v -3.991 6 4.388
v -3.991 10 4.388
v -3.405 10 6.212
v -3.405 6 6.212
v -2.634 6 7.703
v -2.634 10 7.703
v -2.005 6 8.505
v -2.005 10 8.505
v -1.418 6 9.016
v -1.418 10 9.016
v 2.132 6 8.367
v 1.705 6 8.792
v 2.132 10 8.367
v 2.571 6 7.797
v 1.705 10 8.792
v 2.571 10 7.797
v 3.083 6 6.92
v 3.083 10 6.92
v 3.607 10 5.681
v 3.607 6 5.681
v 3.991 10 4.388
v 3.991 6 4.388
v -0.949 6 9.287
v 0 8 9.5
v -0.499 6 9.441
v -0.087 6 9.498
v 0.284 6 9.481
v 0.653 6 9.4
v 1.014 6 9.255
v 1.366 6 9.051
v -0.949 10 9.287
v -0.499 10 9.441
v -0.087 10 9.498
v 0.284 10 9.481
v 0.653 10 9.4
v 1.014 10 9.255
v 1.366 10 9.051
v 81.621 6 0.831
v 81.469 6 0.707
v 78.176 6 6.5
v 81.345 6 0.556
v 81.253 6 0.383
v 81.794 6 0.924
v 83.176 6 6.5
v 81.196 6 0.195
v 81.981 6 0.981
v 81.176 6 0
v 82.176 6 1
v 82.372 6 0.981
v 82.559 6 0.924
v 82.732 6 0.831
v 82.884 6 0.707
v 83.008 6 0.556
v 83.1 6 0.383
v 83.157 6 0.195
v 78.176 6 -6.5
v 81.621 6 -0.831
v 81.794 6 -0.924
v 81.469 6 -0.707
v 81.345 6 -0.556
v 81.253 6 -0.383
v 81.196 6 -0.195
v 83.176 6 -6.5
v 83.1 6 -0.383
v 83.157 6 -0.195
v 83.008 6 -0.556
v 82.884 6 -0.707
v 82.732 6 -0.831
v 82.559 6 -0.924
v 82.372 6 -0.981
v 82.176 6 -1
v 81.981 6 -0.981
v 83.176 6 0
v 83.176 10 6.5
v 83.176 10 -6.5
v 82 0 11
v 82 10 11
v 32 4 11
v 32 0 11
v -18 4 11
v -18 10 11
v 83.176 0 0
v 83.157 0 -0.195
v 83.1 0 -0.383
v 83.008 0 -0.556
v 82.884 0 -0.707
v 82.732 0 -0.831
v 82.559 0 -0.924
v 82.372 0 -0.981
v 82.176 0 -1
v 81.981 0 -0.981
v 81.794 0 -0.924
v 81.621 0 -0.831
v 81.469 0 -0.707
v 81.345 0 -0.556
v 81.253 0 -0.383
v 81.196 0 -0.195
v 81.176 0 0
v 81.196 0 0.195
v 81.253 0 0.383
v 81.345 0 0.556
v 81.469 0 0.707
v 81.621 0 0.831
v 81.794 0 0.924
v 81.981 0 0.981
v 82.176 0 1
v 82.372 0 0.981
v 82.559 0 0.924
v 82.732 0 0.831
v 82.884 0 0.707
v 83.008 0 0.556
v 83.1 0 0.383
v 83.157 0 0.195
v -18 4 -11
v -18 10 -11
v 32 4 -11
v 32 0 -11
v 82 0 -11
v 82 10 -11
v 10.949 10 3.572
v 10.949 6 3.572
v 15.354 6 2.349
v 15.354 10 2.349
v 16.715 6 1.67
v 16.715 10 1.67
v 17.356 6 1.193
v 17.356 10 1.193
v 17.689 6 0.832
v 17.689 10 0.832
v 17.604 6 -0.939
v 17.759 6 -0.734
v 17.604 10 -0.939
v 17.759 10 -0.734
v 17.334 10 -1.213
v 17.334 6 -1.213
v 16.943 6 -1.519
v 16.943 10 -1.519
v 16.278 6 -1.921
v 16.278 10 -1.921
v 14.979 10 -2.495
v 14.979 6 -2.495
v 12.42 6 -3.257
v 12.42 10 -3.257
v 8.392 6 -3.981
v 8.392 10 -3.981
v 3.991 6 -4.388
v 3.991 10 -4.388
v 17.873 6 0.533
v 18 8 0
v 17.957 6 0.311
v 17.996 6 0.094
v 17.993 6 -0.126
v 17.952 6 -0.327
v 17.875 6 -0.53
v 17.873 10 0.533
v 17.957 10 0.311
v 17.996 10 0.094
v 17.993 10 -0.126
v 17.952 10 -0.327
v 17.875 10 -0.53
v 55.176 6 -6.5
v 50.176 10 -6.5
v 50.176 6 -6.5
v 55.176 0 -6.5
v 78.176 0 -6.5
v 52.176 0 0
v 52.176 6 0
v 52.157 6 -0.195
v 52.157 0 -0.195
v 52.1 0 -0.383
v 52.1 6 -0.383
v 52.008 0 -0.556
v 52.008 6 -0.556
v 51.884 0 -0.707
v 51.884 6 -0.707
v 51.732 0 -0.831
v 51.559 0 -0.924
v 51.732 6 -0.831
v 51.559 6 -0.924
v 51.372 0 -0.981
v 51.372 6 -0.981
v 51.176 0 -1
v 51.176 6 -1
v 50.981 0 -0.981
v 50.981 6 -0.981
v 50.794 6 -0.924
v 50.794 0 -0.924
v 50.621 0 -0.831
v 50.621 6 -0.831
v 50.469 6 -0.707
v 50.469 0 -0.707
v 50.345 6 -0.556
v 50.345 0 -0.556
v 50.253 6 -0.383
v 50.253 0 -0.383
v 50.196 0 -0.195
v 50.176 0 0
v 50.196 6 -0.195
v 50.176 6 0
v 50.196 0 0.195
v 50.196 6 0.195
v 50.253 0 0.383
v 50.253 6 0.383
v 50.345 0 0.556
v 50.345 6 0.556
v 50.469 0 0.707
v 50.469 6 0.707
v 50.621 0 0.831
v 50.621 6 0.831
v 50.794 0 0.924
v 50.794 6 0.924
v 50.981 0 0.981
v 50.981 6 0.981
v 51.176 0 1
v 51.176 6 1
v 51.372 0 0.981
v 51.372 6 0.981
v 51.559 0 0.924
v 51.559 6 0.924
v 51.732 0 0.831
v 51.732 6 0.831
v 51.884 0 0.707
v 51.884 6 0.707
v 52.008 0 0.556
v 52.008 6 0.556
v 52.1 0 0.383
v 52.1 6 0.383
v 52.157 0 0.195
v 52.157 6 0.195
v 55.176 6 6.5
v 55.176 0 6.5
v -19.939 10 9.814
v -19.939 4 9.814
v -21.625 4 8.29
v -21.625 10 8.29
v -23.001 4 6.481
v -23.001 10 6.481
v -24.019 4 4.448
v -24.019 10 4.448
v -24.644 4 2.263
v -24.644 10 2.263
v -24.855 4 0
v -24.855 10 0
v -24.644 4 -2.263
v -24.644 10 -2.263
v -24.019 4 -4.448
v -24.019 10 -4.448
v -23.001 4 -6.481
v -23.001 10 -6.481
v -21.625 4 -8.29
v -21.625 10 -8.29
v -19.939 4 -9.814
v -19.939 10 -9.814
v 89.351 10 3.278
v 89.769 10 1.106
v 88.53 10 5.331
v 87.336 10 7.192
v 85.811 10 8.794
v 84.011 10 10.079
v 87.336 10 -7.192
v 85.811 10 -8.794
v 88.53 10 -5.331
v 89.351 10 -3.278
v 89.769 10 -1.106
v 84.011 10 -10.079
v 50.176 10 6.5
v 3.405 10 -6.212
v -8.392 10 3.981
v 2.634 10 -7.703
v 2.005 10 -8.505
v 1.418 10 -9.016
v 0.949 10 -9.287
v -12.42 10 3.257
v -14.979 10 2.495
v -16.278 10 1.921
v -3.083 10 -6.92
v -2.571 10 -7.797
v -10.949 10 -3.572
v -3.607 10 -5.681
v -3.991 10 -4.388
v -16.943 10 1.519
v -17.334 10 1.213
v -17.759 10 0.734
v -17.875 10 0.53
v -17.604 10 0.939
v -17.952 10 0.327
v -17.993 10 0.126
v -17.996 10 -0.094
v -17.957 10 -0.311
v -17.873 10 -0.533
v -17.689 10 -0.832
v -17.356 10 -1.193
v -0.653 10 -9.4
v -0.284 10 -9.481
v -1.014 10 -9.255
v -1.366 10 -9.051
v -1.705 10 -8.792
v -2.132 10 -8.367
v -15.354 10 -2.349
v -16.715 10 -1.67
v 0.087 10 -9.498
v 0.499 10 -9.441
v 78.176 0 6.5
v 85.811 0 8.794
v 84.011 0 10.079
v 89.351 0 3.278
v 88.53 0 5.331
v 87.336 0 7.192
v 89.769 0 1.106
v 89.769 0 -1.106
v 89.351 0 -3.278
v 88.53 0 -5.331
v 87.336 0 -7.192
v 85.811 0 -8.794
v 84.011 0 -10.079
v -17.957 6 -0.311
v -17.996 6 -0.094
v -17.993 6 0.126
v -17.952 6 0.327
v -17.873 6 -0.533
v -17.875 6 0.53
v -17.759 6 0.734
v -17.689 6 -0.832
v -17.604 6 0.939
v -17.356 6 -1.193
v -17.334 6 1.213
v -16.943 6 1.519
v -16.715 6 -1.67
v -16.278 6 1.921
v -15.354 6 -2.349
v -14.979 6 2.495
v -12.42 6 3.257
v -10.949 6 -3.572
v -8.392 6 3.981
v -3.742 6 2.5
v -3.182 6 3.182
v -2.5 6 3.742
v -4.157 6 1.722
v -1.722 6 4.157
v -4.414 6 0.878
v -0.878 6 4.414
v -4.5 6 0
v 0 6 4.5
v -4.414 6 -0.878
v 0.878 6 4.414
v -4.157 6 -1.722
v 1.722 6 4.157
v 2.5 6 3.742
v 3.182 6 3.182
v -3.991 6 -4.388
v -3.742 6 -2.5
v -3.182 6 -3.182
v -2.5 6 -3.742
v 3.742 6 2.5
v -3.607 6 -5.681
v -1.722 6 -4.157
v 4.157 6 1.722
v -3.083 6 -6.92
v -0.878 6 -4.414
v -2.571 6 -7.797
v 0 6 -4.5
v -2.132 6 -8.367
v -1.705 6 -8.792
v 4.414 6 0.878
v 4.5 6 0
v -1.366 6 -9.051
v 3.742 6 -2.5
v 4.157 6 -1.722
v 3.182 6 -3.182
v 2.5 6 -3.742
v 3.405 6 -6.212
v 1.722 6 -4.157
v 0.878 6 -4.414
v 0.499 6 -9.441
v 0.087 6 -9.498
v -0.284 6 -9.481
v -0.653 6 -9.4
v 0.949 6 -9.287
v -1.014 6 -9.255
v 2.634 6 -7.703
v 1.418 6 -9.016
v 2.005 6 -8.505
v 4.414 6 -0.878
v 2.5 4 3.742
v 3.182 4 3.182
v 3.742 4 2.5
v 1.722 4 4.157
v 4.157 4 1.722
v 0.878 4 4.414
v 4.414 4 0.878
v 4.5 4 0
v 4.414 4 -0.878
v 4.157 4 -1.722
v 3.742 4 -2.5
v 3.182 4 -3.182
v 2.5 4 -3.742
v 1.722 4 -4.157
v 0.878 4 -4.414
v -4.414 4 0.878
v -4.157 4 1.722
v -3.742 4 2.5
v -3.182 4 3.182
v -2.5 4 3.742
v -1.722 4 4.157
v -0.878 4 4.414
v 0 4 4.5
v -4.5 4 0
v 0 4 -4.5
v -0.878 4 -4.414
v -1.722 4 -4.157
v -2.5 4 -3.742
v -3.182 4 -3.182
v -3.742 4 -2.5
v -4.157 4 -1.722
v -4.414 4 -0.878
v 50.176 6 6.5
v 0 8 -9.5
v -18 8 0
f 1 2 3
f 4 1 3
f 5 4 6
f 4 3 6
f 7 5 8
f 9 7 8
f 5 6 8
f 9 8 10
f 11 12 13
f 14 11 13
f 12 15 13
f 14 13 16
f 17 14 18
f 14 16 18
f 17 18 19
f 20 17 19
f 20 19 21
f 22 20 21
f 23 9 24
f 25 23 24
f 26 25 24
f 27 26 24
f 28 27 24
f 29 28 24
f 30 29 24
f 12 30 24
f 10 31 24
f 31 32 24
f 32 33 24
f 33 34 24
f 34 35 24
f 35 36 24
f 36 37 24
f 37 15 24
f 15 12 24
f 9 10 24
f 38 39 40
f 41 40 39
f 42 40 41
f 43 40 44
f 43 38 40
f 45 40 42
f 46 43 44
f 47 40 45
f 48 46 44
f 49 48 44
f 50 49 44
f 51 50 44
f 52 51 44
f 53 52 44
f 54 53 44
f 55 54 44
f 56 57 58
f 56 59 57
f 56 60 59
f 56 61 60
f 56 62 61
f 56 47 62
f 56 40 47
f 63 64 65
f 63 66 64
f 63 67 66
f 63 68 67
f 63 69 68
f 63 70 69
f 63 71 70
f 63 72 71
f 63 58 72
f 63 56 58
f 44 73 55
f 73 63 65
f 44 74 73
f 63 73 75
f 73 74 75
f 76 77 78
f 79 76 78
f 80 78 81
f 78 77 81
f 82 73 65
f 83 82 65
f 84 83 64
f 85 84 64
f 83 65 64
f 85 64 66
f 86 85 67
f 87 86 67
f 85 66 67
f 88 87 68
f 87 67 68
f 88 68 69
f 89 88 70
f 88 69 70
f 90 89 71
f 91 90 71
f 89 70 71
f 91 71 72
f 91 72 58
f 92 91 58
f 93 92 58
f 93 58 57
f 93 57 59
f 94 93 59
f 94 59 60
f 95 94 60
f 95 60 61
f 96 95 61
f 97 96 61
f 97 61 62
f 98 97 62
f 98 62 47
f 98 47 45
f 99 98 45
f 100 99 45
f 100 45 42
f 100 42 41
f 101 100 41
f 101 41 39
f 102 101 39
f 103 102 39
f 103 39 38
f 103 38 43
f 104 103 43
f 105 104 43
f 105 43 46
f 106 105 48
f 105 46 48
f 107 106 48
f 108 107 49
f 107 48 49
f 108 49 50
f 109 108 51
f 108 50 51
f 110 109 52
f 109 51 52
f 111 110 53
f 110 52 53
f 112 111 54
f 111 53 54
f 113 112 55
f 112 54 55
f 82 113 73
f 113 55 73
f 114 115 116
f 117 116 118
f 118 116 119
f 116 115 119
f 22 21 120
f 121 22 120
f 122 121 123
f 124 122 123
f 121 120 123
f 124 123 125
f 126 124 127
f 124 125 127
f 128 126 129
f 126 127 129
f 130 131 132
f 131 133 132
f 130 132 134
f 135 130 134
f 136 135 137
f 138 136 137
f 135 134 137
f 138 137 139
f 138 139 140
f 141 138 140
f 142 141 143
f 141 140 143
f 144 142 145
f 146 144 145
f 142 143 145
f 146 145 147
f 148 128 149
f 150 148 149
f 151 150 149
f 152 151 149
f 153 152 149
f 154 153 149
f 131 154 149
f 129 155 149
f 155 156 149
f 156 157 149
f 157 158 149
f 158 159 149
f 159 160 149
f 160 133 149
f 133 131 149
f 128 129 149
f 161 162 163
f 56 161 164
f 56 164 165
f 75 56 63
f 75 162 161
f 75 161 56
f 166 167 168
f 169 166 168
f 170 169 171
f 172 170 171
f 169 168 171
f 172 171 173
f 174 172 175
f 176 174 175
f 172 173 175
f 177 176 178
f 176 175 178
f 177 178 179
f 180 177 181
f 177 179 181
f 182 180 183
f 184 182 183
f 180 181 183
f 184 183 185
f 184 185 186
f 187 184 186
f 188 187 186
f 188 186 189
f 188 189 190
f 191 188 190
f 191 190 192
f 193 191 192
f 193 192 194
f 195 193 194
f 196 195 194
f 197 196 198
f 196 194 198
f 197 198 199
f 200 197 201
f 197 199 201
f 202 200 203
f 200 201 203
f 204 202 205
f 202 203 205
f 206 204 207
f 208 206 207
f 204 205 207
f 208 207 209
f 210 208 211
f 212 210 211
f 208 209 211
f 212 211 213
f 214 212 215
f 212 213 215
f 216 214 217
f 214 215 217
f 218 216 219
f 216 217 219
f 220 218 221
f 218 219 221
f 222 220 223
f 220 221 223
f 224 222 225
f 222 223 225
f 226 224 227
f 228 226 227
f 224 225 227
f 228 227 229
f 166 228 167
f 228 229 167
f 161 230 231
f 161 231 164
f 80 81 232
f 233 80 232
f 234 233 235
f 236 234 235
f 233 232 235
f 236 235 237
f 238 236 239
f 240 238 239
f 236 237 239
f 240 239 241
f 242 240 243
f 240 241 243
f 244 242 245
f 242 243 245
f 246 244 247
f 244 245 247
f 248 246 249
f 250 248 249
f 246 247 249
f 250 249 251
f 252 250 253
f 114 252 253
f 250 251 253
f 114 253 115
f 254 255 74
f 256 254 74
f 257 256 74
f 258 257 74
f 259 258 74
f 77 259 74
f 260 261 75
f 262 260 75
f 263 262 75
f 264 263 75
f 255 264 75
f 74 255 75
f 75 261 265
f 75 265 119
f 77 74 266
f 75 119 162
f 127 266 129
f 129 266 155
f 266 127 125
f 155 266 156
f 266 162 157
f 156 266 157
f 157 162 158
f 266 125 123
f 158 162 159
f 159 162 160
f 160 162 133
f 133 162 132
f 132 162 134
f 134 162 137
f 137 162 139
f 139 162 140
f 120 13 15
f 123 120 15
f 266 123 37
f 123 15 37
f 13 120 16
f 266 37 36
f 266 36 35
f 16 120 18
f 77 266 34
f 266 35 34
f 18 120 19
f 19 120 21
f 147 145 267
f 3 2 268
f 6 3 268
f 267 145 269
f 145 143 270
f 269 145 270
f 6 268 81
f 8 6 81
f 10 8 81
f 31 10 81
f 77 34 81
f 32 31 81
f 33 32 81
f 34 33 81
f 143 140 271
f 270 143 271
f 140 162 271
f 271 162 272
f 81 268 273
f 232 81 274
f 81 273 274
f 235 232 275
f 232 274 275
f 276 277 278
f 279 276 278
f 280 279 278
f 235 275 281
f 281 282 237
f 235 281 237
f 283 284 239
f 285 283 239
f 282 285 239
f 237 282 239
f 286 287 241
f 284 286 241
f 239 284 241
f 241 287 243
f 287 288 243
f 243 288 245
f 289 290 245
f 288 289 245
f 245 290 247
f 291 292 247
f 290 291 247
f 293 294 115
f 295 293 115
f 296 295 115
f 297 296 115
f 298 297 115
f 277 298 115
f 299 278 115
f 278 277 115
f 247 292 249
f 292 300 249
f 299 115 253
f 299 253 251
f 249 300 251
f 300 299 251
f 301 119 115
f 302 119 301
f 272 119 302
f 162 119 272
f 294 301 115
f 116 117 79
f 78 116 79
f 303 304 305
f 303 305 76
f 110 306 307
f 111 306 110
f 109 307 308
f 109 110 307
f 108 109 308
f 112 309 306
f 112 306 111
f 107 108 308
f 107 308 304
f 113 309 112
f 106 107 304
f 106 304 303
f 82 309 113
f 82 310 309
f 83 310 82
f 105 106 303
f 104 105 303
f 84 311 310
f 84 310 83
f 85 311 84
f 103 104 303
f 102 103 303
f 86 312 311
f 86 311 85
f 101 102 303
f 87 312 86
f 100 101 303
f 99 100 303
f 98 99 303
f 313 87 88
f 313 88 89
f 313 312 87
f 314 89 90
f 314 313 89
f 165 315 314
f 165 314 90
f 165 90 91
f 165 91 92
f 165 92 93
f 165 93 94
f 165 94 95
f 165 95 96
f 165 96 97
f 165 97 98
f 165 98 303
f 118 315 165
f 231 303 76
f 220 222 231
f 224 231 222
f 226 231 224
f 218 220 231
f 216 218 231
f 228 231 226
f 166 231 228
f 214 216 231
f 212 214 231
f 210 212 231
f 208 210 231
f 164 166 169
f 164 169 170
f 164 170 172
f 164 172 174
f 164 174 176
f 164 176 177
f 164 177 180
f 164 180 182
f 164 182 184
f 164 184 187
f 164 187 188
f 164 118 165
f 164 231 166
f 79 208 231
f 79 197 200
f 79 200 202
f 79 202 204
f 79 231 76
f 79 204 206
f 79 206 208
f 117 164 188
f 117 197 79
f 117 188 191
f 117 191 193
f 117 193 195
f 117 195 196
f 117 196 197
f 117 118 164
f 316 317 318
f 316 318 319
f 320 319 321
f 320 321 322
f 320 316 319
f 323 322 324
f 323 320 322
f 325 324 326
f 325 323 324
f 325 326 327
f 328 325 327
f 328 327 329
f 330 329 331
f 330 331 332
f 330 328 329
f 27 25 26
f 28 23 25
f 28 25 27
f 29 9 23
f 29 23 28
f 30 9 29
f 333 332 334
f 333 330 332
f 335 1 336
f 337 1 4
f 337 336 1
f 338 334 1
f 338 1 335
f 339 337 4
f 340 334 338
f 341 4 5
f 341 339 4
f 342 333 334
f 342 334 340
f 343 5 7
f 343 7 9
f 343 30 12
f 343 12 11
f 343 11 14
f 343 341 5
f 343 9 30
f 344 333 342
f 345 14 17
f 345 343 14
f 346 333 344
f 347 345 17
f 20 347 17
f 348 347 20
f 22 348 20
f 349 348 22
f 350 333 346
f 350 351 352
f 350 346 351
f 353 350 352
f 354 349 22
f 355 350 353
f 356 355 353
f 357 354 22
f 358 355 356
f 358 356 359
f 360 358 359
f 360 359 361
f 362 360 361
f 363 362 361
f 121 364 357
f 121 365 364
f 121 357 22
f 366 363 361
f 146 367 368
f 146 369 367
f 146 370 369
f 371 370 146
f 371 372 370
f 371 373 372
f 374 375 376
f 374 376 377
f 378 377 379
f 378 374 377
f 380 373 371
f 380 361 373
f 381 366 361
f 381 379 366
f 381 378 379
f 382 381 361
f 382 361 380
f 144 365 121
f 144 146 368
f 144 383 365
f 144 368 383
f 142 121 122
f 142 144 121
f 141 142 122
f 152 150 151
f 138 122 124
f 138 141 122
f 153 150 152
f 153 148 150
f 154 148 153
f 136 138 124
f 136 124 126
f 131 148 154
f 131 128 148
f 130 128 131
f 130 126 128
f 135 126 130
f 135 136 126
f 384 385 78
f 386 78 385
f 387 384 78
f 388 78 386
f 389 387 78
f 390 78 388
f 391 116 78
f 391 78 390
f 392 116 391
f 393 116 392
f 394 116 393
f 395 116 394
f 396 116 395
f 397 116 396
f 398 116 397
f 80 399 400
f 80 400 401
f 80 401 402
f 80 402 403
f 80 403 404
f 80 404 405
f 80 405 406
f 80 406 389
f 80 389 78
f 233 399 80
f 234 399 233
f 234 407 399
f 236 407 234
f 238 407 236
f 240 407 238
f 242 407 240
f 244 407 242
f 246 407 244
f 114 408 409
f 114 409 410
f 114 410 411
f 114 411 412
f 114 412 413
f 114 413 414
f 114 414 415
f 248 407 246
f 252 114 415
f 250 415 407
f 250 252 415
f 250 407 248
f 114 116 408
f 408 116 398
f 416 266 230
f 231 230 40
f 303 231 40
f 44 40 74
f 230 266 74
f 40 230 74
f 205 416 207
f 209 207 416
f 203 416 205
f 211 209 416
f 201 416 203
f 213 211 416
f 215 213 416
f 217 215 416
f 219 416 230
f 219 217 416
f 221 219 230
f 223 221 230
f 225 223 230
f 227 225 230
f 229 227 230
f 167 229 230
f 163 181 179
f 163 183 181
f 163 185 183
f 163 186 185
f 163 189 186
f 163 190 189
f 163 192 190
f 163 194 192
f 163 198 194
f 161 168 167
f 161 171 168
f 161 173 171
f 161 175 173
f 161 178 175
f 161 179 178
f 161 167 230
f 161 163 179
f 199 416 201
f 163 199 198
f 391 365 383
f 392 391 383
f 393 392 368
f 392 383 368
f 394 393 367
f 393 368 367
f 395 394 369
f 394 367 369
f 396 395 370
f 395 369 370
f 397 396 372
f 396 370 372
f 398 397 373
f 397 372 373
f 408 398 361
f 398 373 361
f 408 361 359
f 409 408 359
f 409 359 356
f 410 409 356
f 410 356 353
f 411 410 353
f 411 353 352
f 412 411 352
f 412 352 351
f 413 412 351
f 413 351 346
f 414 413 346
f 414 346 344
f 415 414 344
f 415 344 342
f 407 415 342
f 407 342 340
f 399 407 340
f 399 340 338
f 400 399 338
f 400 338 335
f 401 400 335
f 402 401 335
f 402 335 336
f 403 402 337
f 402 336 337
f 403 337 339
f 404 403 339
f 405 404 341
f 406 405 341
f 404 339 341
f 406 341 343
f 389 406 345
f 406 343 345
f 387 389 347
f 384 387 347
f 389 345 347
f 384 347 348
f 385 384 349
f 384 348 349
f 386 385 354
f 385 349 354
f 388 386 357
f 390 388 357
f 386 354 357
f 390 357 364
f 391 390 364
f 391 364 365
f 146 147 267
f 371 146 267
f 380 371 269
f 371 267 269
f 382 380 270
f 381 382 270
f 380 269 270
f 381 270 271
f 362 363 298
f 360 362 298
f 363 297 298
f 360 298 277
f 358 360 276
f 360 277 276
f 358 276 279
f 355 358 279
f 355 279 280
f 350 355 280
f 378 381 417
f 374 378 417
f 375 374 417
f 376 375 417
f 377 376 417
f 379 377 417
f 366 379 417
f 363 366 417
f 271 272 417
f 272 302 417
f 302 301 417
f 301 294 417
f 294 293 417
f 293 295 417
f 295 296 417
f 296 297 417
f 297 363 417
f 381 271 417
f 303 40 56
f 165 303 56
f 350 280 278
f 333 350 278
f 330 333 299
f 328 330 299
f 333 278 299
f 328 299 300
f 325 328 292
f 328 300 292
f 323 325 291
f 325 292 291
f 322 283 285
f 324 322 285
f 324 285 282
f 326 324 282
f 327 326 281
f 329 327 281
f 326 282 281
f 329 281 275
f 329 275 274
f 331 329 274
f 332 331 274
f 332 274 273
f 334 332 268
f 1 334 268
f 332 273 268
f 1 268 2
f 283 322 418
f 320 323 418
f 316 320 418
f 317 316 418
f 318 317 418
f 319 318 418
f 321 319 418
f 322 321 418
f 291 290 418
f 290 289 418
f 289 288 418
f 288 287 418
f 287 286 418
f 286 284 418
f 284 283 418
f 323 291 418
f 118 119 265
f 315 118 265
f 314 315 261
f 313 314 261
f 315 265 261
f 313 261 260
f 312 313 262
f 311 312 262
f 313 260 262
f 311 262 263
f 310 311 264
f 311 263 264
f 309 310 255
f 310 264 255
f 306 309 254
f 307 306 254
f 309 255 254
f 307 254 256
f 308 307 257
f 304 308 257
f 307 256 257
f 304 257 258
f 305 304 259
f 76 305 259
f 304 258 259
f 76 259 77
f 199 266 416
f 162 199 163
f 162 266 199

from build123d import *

# Parameters (mm, degrees)
EXTRUDE_1_DEPTH     = 10
SKETCH_2_R          = 4.5
CUT_EXTRUDE_1_DEPTH = 21
CUT_EXTRUDE_2_DEPTH = 4
SKETCH_4_W          = 23
SKETCH_4_H          = 13
CUT_EXTRUDE_3_DEPTH = 21
SKETCH_5_W          = 5
SKETCH_5_H          = 13
CUT_EXTRUDE_4_DEPTH = 4
CUT_EXTRUDE_5_DEPTH = 10
SKETCH_7_R          = 1
CUT_EXTRUDE_6_DEPTH = 11
CUT_EXTRUDE_7_DEPTH = 4


with BuildPart() as part:
    # 草图1 → 凸台-拉伸1 (new body, symmetric)
    with BuildSketch(Plane(origin=(0, 0, 0), x_dir=(1, 0, 0), z_dir=(0, 1, 0))):
        with BuildLine():
            Line((-18, 11), (82, 11))
            ThreePointArc((82, 11), (89.822046697, 0), (82, -11))
            Line((82, -11), (-18, -11))
            ThreePointArc((-18, -11), (-24.855224852, 0), (-18, 11))
        make_face()
    extrude(amount=EXTRUDE_1_DEPTH, both=True)

    # 草图2 → 切除-拉伸1 (cut, through all)
    with BuildSketch(Plane(origin=(0, 10, 0), x_dir=(1, 0, 0), z_dir=(0, 1, 0))):
        Circle(SKETCH_2_R)
    extrude(amount=-CUT_EXTRUDE_1_DEPTH, mode=Mode.SUBTRACT)

    # 草图3 → 切除-拉伸2 (cut)
    with BuildSketch(Plane(origin=(0, 10, 0), x_dir=(1, 0, 0), z_dir=(0, 1, 0))):
        with BuildLine():
            add(Edge.make_bspline(
                [(-3.991210712, 4.387982431), (-18, 3.591602336), (-18, 0), (-18, -3.591602336), (-3.991210712, -4.387982431)],
                knots=[1.794388632, 1.794388632, 1.794388632, 3.141592654, 3.141592654, 4.488796676, 4.488796676, 4.488796676], degree=2, weights=[1, 0.781579788, 1, 0.781579788, 1]))
            add(Edge.make_bspline(
                [(-3.991210712, -4.387982431), (0, -20.567539049), (3.991210712, -4.387982431)],
                knots=[2.05092453, 2.05092453, 2.05092453, 4.232260777, 4.232260777, 4.232260777], degree=2, weights=[1, 0.461892887, 1]))
            add(Edge.make_bspline(
                [(3.991210712, -4.387982431), (18, -3.591602336), (18, 0), (18, 3.591602336), (3.991210712, 4.387982431)],
                knots=[4.935981285, 4.935981285, 4.935981285, 6.283185307, 6.283185307, 7.630389329, 7.630389329, 7.630389329], degree=2, weights=[1, 0.781579788, 1, 0.781579788, 1]))
            add(Edge.make_bspline(
                [(3.991210712, 4.387982431), (0, 20.567539049), (-3.991210712, 4.387982431)],
                knots=[5.192517184, 5.192517184, 5.192517184, 7.373853431, 7.373853431, 7.373853431], degree=2, weights=[1, 0.461892887, 1]))
        make_face()
    extrude(amount=-CUT_EXTRUDE_2_DEPTH, mode=Mode.SUBTRACT)

    # 草图4 → 切除-拉伸3 (cut, through all)
    with BuildSketch(Plane(origin=(0, 10, 0), x_dir=(1, 0, 0), z_dir=(0, 1, 0))):
        with Locations((66.67647479, 0)):
            Rectangle(SKETCH_4_W, SKETCH_4_H)
    extrude(amount=-CUT_EXTRUDE_3_DEPTH, mode=Mode.SUBTRACT)

    # 草图5 → 切除-拉伸4 (cut)
    with BuildSketch(Plane(origin=(0, 10, 0), x_dir=(1, 0, 0), z_dir=(0, 1, 0))):
        with Locations((52.67647479, 0)):
            Rectangle(SKETCH_5_W, SKETCH_5_H)
        with Locations((80.67647479, 0)):
            Rectangle(SKETCH_5_W, SKETCH_5_H)
    extrude(amount=-CUT_EXTRUDE_4_DEPTH, mode=Mode.SUBTRACT)

    # 草图6 → 切除-拉伸5 (cut)
    with BuildSketch(Plane(origin=(0, -10, 0), x_dir=(-1, 0, 0), z_dir=(0, -1, 0))):
        with BuildLine():
            Line((18, 11), (-82, 11))
            ThreePointArc((-82, 11), (-89.822046697, 0), (-82, -11))
            Line((-82, -11), (18, -11))
            ThreePointArc((18, -11), (24.855224852, 0), (18, 11))
        make_face()
    extrude(amount=-CUT_EXTRUDE_5_DEPTH, mode=Mode.SUBTRACT)

    # 草图7 → 切除-拉伸6 (cut, through all)
    with BuildSketch(Plane(origin=(0, 10, 0), x_dir=(1, 0, 0), z_dir=(0, 1, 0))):
        with Locations((82.17647479, 0)):
            Circle(SKETCH_7_R)
        with Locations((51.17647479, 0)):
            Circle(SKETCH_7_R)
    extrude(amount=-CUT_EXTRUDE_6_DEPTH, mode=Mode.SUBTRACT)

    # 草图8 → 切除-拉伸7 (cut)
    with BuildSketch(Plane(origin=(0, 0, 0), x_dir=(-1, 0, 0), z_dir=(0, -1, 0))):
        with BuildLine():
            Line((-32, -11), (18, -11))
            ThreePointArc((18, -11), (24.855224852, 0), (18, 11))
            Line((18, 11), (-32, 11))
            Line((-32, 11), (-32, -11))
        make_face()
    extrude(amount=-CUT_EXTRUDE_7_DEPTH, mode=Mode.SUBTRACT)


solid = part.part
